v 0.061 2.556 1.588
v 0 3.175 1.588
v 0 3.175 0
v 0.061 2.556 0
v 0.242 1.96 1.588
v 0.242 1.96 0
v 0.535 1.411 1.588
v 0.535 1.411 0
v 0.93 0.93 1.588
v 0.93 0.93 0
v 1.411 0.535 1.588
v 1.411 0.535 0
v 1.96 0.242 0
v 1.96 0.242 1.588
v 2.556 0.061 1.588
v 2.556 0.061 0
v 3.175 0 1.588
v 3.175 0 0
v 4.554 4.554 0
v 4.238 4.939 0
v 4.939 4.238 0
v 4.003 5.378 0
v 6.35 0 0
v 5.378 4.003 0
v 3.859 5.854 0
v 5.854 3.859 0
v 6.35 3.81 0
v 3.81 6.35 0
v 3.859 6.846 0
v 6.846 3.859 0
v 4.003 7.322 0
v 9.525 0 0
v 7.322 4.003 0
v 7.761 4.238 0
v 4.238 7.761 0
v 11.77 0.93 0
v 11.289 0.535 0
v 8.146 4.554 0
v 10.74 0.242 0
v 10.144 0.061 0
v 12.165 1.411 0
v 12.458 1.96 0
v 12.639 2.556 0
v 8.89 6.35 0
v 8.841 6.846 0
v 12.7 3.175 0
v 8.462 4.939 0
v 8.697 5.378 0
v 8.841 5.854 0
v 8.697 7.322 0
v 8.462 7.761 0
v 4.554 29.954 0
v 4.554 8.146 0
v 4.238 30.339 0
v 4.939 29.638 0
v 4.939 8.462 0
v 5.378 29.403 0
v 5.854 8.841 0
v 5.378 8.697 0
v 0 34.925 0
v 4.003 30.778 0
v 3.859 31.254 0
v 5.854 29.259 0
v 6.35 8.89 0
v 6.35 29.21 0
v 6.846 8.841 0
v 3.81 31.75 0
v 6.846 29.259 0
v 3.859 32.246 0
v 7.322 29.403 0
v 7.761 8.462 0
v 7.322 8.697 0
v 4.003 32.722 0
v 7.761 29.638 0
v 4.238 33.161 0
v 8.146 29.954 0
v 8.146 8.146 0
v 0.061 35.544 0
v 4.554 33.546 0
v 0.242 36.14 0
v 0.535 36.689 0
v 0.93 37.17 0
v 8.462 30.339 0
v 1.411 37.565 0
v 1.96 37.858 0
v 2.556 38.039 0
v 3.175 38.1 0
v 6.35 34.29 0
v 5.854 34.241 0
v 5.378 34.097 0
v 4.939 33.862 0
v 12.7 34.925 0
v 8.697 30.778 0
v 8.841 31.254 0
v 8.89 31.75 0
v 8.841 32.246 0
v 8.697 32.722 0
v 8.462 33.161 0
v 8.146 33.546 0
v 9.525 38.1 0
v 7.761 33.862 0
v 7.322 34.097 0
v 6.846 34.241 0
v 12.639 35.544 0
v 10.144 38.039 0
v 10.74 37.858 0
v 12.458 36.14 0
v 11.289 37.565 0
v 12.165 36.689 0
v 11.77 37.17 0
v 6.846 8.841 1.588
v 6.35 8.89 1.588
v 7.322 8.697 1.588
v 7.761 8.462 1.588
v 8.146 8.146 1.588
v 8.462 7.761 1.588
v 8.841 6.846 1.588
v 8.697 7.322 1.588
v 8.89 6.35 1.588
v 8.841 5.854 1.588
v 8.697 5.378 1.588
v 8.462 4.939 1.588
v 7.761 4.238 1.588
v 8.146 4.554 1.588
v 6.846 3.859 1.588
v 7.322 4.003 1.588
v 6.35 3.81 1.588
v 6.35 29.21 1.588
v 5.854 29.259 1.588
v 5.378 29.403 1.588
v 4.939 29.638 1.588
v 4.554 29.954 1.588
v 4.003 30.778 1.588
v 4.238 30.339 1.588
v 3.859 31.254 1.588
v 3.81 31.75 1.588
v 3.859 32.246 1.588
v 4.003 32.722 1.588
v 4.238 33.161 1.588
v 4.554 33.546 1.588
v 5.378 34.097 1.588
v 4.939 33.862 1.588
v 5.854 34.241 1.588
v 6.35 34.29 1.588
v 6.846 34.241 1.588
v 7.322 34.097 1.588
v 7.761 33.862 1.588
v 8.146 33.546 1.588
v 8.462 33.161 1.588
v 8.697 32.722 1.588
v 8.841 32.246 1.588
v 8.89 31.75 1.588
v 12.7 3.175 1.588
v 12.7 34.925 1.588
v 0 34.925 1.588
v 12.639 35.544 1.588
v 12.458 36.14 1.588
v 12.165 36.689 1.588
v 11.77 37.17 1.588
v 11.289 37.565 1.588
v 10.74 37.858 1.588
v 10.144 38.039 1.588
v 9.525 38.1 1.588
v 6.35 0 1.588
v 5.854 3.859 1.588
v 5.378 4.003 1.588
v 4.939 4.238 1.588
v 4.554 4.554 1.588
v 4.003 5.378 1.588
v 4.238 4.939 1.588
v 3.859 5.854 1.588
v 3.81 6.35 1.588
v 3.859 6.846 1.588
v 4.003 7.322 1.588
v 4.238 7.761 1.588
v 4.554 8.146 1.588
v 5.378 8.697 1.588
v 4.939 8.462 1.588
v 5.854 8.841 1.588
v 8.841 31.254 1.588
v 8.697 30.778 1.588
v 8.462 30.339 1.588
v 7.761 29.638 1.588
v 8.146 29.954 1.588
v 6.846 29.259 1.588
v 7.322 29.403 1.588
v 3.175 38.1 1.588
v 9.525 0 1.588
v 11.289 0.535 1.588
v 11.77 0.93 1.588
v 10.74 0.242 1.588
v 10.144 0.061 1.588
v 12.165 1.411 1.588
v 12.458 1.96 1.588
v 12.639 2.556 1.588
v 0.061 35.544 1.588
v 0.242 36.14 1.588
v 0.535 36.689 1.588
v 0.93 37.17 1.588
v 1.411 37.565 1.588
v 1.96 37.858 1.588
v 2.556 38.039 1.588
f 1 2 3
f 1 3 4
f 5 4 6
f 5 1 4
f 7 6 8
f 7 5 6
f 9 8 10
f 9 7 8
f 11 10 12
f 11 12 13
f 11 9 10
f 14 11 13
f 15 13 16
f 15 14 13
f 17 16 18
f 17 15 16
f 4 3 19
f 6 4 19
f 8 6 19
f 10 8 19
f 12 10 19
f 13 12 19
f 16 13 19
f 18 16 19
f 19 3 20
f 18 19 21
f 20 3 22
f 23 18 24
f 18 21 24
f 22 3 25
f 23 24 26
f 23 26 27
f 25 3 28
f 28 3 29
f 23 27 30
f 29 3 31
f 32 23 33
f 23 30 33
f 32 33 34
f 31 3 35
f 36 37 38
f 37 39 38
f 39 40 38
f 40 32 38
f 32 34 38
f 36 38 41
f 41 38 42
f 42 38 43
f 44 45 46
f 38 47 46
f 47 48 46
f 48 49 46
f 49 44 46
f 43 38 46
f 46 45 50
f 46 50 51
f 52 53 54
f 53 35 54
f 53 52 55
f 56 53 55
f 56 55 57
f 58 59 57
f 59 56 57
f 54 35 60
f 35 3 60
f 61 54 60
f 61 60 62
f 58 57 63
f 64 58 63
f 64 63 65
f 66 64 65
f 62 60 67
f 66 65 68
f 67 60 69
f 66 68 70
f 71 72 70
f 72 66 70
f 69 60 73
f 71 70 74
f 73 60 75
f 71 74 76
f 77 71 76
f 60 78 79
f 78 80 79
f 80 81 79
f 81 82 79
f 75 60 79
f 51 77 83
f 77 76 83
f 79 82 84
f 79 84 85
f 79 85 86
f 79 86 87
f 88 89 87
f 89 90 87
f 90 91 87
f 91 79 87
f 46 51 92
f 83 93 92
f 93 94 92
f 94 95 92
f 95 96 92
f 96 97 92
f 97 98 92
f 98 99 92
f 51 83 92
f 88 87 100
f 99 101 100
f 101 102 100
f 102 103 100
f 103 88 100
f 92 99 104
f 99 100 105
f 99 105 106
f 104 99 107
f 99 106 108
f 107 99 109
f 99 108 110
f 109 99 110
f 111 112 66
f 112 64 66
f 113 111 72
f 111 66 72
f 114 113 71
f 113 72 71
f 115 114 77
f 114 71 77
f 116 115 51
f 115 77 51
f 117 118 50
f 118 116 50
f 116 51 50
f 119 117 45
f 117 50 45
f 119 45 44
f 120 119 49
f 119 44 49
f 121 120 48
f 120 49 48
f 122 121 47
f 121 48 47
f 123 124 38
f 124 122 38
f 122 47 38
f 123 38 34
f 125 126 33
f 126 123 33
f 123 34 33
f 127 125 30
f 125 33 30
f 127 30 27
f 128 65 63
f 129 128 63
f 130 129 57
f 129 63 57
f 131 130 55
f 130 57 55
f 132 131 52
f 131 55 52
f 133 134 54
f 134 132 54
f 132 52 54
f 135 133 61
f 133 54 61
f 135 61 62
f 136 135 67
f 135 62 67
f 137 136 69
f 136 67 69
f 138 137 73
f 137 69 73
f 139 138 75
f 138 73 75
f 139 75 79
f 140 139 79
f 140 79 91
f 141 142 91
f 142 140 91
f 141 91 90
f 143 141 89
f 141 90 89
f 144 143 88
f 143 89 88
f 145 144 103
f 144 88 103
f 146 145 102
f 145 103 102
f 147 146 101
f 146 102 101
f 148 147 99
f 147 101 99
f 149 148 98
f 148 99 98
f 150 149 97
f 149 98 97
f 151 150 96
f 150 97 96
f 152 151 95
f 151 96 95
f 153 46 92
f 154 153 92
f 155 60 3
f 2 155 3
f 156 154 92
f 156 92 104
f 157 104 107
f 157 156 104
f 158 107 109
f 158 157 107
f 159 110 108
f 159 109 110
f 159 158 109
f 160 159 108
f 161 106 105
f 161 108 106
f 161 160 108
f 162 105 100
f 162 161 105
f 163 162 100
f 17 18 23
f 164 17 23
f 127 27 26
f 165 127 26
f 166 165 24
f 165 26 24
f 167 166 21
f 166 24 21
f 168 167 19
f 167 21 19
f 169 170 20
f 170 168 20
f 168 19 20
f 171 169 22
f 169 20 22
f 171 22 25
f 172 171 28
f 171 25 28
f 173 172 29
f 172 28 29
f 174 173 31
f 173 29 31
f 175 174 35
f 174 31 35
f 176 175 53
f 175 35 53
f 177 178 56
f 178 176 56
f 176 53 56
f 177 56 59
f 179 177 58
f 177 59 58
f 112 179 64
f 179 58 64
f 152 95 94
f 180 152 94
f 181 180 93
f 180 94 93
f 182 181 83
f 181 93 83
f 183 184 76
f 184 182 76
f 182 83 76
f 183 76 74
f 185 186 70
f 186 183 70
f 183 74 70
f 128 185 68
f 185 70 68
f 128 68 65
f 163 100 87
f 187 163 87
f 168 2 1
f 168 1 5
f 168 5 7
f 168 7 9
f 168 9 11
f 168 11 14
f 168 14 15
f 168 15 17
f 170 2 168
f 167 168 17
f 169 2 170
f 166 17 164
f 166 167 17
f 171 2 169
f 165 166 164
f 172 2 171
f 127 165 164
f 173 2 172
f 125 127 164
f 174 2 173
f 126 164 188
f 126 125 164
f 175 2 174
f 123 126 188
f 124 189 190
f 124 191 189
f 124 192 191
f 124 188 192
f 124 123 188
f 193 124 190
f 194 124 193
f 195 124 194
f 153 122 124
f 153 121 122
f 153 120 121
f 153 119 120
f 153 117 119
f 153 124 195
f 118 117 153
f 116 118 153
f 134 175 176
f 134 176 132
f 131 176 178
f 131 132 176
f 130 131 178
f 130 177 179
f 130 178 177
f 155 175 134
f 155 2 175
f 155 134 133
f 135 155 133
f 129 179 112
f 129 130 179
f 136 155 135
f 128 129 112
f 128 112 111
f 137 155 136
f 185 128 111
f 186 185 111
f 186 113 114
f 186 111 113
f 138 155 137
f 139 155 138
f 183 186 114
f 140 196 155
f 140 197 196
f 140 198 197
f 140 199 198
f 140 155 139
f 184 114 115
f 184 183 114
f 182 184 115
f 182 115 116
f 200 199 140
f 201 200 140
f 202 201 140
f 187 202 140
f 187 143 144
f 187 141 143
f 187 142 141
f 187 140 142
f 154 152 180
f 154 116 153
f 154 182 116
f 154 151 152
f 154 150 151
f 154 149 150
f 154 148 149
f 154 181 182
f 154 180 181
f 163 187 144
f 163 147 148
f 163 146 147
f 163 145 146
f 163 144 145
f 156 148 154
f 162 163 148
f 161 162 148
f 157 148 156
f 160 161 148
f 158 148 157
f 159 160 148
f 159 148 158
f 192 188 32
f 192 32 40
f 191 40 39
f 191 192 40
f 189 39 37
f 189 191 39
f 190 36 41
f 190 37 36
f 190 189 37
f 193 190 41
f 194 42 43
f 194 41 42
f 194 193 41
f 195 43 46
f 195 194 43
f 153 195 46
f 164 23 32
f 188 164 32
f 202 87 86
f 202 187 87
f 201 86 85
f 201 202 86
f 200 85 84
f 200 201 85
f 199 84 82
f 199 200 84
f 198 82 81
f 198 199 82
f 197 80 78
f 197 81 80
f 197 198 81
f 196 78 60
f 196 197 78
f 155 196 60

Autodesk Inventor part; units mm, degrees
ref_plane "YZ Plane" through (0, 0, 0) normal (1, 0, 0) x (0, 1, 0)
ref_plane "XZ Plane" through (0, 0, 0) normal (0, 1, 0) x (-1, 0, 0)
ref_plane "XY Plane" through (0, 0, 0) normal (0, 0, 1) x (1, 0, 0)
sketch "Sketch1" plane through (0, 0, 0) normal (0, 0, 1) x (1, 0, 0)
  line L0 (0, 0) -> (12.7, 0)
  line L1 (12.7, 0) -> (12.7, 38.1)
  line L2 (12.7, 38.1) -> (0, 38.1)
  line L3 (0, 38.1) -> (0, 0)
  line L4 (6.35, 0) -> (6.35, 6.35)
  line L5 (6.35, 6.35) -> (6.35, 31.75)
  circle A0 centre (6.35, 31.75) radius 2.54
  circle A1 centre (6.35, 6.35) radius 2.54
  dimension "d0" = 38.1
  dimension "d1" = 12.7
  dimension "d2" = 6.35
  dimension "d3" = 25.4
  dimension "d4" = 5.08
  dimension "d5" = 5.08
extrude "Extrusion1" add sketch "Sketch1" along normal blind 1.5875
fillet "Fillet1" radius 3.175 4 edges at (12.7, 0, 0.7937) (0, 0, 0.7937) (12.7, 38.1, 0.7937) (0, 38.1, 0.7937)
properties part number "polySpacer1"
